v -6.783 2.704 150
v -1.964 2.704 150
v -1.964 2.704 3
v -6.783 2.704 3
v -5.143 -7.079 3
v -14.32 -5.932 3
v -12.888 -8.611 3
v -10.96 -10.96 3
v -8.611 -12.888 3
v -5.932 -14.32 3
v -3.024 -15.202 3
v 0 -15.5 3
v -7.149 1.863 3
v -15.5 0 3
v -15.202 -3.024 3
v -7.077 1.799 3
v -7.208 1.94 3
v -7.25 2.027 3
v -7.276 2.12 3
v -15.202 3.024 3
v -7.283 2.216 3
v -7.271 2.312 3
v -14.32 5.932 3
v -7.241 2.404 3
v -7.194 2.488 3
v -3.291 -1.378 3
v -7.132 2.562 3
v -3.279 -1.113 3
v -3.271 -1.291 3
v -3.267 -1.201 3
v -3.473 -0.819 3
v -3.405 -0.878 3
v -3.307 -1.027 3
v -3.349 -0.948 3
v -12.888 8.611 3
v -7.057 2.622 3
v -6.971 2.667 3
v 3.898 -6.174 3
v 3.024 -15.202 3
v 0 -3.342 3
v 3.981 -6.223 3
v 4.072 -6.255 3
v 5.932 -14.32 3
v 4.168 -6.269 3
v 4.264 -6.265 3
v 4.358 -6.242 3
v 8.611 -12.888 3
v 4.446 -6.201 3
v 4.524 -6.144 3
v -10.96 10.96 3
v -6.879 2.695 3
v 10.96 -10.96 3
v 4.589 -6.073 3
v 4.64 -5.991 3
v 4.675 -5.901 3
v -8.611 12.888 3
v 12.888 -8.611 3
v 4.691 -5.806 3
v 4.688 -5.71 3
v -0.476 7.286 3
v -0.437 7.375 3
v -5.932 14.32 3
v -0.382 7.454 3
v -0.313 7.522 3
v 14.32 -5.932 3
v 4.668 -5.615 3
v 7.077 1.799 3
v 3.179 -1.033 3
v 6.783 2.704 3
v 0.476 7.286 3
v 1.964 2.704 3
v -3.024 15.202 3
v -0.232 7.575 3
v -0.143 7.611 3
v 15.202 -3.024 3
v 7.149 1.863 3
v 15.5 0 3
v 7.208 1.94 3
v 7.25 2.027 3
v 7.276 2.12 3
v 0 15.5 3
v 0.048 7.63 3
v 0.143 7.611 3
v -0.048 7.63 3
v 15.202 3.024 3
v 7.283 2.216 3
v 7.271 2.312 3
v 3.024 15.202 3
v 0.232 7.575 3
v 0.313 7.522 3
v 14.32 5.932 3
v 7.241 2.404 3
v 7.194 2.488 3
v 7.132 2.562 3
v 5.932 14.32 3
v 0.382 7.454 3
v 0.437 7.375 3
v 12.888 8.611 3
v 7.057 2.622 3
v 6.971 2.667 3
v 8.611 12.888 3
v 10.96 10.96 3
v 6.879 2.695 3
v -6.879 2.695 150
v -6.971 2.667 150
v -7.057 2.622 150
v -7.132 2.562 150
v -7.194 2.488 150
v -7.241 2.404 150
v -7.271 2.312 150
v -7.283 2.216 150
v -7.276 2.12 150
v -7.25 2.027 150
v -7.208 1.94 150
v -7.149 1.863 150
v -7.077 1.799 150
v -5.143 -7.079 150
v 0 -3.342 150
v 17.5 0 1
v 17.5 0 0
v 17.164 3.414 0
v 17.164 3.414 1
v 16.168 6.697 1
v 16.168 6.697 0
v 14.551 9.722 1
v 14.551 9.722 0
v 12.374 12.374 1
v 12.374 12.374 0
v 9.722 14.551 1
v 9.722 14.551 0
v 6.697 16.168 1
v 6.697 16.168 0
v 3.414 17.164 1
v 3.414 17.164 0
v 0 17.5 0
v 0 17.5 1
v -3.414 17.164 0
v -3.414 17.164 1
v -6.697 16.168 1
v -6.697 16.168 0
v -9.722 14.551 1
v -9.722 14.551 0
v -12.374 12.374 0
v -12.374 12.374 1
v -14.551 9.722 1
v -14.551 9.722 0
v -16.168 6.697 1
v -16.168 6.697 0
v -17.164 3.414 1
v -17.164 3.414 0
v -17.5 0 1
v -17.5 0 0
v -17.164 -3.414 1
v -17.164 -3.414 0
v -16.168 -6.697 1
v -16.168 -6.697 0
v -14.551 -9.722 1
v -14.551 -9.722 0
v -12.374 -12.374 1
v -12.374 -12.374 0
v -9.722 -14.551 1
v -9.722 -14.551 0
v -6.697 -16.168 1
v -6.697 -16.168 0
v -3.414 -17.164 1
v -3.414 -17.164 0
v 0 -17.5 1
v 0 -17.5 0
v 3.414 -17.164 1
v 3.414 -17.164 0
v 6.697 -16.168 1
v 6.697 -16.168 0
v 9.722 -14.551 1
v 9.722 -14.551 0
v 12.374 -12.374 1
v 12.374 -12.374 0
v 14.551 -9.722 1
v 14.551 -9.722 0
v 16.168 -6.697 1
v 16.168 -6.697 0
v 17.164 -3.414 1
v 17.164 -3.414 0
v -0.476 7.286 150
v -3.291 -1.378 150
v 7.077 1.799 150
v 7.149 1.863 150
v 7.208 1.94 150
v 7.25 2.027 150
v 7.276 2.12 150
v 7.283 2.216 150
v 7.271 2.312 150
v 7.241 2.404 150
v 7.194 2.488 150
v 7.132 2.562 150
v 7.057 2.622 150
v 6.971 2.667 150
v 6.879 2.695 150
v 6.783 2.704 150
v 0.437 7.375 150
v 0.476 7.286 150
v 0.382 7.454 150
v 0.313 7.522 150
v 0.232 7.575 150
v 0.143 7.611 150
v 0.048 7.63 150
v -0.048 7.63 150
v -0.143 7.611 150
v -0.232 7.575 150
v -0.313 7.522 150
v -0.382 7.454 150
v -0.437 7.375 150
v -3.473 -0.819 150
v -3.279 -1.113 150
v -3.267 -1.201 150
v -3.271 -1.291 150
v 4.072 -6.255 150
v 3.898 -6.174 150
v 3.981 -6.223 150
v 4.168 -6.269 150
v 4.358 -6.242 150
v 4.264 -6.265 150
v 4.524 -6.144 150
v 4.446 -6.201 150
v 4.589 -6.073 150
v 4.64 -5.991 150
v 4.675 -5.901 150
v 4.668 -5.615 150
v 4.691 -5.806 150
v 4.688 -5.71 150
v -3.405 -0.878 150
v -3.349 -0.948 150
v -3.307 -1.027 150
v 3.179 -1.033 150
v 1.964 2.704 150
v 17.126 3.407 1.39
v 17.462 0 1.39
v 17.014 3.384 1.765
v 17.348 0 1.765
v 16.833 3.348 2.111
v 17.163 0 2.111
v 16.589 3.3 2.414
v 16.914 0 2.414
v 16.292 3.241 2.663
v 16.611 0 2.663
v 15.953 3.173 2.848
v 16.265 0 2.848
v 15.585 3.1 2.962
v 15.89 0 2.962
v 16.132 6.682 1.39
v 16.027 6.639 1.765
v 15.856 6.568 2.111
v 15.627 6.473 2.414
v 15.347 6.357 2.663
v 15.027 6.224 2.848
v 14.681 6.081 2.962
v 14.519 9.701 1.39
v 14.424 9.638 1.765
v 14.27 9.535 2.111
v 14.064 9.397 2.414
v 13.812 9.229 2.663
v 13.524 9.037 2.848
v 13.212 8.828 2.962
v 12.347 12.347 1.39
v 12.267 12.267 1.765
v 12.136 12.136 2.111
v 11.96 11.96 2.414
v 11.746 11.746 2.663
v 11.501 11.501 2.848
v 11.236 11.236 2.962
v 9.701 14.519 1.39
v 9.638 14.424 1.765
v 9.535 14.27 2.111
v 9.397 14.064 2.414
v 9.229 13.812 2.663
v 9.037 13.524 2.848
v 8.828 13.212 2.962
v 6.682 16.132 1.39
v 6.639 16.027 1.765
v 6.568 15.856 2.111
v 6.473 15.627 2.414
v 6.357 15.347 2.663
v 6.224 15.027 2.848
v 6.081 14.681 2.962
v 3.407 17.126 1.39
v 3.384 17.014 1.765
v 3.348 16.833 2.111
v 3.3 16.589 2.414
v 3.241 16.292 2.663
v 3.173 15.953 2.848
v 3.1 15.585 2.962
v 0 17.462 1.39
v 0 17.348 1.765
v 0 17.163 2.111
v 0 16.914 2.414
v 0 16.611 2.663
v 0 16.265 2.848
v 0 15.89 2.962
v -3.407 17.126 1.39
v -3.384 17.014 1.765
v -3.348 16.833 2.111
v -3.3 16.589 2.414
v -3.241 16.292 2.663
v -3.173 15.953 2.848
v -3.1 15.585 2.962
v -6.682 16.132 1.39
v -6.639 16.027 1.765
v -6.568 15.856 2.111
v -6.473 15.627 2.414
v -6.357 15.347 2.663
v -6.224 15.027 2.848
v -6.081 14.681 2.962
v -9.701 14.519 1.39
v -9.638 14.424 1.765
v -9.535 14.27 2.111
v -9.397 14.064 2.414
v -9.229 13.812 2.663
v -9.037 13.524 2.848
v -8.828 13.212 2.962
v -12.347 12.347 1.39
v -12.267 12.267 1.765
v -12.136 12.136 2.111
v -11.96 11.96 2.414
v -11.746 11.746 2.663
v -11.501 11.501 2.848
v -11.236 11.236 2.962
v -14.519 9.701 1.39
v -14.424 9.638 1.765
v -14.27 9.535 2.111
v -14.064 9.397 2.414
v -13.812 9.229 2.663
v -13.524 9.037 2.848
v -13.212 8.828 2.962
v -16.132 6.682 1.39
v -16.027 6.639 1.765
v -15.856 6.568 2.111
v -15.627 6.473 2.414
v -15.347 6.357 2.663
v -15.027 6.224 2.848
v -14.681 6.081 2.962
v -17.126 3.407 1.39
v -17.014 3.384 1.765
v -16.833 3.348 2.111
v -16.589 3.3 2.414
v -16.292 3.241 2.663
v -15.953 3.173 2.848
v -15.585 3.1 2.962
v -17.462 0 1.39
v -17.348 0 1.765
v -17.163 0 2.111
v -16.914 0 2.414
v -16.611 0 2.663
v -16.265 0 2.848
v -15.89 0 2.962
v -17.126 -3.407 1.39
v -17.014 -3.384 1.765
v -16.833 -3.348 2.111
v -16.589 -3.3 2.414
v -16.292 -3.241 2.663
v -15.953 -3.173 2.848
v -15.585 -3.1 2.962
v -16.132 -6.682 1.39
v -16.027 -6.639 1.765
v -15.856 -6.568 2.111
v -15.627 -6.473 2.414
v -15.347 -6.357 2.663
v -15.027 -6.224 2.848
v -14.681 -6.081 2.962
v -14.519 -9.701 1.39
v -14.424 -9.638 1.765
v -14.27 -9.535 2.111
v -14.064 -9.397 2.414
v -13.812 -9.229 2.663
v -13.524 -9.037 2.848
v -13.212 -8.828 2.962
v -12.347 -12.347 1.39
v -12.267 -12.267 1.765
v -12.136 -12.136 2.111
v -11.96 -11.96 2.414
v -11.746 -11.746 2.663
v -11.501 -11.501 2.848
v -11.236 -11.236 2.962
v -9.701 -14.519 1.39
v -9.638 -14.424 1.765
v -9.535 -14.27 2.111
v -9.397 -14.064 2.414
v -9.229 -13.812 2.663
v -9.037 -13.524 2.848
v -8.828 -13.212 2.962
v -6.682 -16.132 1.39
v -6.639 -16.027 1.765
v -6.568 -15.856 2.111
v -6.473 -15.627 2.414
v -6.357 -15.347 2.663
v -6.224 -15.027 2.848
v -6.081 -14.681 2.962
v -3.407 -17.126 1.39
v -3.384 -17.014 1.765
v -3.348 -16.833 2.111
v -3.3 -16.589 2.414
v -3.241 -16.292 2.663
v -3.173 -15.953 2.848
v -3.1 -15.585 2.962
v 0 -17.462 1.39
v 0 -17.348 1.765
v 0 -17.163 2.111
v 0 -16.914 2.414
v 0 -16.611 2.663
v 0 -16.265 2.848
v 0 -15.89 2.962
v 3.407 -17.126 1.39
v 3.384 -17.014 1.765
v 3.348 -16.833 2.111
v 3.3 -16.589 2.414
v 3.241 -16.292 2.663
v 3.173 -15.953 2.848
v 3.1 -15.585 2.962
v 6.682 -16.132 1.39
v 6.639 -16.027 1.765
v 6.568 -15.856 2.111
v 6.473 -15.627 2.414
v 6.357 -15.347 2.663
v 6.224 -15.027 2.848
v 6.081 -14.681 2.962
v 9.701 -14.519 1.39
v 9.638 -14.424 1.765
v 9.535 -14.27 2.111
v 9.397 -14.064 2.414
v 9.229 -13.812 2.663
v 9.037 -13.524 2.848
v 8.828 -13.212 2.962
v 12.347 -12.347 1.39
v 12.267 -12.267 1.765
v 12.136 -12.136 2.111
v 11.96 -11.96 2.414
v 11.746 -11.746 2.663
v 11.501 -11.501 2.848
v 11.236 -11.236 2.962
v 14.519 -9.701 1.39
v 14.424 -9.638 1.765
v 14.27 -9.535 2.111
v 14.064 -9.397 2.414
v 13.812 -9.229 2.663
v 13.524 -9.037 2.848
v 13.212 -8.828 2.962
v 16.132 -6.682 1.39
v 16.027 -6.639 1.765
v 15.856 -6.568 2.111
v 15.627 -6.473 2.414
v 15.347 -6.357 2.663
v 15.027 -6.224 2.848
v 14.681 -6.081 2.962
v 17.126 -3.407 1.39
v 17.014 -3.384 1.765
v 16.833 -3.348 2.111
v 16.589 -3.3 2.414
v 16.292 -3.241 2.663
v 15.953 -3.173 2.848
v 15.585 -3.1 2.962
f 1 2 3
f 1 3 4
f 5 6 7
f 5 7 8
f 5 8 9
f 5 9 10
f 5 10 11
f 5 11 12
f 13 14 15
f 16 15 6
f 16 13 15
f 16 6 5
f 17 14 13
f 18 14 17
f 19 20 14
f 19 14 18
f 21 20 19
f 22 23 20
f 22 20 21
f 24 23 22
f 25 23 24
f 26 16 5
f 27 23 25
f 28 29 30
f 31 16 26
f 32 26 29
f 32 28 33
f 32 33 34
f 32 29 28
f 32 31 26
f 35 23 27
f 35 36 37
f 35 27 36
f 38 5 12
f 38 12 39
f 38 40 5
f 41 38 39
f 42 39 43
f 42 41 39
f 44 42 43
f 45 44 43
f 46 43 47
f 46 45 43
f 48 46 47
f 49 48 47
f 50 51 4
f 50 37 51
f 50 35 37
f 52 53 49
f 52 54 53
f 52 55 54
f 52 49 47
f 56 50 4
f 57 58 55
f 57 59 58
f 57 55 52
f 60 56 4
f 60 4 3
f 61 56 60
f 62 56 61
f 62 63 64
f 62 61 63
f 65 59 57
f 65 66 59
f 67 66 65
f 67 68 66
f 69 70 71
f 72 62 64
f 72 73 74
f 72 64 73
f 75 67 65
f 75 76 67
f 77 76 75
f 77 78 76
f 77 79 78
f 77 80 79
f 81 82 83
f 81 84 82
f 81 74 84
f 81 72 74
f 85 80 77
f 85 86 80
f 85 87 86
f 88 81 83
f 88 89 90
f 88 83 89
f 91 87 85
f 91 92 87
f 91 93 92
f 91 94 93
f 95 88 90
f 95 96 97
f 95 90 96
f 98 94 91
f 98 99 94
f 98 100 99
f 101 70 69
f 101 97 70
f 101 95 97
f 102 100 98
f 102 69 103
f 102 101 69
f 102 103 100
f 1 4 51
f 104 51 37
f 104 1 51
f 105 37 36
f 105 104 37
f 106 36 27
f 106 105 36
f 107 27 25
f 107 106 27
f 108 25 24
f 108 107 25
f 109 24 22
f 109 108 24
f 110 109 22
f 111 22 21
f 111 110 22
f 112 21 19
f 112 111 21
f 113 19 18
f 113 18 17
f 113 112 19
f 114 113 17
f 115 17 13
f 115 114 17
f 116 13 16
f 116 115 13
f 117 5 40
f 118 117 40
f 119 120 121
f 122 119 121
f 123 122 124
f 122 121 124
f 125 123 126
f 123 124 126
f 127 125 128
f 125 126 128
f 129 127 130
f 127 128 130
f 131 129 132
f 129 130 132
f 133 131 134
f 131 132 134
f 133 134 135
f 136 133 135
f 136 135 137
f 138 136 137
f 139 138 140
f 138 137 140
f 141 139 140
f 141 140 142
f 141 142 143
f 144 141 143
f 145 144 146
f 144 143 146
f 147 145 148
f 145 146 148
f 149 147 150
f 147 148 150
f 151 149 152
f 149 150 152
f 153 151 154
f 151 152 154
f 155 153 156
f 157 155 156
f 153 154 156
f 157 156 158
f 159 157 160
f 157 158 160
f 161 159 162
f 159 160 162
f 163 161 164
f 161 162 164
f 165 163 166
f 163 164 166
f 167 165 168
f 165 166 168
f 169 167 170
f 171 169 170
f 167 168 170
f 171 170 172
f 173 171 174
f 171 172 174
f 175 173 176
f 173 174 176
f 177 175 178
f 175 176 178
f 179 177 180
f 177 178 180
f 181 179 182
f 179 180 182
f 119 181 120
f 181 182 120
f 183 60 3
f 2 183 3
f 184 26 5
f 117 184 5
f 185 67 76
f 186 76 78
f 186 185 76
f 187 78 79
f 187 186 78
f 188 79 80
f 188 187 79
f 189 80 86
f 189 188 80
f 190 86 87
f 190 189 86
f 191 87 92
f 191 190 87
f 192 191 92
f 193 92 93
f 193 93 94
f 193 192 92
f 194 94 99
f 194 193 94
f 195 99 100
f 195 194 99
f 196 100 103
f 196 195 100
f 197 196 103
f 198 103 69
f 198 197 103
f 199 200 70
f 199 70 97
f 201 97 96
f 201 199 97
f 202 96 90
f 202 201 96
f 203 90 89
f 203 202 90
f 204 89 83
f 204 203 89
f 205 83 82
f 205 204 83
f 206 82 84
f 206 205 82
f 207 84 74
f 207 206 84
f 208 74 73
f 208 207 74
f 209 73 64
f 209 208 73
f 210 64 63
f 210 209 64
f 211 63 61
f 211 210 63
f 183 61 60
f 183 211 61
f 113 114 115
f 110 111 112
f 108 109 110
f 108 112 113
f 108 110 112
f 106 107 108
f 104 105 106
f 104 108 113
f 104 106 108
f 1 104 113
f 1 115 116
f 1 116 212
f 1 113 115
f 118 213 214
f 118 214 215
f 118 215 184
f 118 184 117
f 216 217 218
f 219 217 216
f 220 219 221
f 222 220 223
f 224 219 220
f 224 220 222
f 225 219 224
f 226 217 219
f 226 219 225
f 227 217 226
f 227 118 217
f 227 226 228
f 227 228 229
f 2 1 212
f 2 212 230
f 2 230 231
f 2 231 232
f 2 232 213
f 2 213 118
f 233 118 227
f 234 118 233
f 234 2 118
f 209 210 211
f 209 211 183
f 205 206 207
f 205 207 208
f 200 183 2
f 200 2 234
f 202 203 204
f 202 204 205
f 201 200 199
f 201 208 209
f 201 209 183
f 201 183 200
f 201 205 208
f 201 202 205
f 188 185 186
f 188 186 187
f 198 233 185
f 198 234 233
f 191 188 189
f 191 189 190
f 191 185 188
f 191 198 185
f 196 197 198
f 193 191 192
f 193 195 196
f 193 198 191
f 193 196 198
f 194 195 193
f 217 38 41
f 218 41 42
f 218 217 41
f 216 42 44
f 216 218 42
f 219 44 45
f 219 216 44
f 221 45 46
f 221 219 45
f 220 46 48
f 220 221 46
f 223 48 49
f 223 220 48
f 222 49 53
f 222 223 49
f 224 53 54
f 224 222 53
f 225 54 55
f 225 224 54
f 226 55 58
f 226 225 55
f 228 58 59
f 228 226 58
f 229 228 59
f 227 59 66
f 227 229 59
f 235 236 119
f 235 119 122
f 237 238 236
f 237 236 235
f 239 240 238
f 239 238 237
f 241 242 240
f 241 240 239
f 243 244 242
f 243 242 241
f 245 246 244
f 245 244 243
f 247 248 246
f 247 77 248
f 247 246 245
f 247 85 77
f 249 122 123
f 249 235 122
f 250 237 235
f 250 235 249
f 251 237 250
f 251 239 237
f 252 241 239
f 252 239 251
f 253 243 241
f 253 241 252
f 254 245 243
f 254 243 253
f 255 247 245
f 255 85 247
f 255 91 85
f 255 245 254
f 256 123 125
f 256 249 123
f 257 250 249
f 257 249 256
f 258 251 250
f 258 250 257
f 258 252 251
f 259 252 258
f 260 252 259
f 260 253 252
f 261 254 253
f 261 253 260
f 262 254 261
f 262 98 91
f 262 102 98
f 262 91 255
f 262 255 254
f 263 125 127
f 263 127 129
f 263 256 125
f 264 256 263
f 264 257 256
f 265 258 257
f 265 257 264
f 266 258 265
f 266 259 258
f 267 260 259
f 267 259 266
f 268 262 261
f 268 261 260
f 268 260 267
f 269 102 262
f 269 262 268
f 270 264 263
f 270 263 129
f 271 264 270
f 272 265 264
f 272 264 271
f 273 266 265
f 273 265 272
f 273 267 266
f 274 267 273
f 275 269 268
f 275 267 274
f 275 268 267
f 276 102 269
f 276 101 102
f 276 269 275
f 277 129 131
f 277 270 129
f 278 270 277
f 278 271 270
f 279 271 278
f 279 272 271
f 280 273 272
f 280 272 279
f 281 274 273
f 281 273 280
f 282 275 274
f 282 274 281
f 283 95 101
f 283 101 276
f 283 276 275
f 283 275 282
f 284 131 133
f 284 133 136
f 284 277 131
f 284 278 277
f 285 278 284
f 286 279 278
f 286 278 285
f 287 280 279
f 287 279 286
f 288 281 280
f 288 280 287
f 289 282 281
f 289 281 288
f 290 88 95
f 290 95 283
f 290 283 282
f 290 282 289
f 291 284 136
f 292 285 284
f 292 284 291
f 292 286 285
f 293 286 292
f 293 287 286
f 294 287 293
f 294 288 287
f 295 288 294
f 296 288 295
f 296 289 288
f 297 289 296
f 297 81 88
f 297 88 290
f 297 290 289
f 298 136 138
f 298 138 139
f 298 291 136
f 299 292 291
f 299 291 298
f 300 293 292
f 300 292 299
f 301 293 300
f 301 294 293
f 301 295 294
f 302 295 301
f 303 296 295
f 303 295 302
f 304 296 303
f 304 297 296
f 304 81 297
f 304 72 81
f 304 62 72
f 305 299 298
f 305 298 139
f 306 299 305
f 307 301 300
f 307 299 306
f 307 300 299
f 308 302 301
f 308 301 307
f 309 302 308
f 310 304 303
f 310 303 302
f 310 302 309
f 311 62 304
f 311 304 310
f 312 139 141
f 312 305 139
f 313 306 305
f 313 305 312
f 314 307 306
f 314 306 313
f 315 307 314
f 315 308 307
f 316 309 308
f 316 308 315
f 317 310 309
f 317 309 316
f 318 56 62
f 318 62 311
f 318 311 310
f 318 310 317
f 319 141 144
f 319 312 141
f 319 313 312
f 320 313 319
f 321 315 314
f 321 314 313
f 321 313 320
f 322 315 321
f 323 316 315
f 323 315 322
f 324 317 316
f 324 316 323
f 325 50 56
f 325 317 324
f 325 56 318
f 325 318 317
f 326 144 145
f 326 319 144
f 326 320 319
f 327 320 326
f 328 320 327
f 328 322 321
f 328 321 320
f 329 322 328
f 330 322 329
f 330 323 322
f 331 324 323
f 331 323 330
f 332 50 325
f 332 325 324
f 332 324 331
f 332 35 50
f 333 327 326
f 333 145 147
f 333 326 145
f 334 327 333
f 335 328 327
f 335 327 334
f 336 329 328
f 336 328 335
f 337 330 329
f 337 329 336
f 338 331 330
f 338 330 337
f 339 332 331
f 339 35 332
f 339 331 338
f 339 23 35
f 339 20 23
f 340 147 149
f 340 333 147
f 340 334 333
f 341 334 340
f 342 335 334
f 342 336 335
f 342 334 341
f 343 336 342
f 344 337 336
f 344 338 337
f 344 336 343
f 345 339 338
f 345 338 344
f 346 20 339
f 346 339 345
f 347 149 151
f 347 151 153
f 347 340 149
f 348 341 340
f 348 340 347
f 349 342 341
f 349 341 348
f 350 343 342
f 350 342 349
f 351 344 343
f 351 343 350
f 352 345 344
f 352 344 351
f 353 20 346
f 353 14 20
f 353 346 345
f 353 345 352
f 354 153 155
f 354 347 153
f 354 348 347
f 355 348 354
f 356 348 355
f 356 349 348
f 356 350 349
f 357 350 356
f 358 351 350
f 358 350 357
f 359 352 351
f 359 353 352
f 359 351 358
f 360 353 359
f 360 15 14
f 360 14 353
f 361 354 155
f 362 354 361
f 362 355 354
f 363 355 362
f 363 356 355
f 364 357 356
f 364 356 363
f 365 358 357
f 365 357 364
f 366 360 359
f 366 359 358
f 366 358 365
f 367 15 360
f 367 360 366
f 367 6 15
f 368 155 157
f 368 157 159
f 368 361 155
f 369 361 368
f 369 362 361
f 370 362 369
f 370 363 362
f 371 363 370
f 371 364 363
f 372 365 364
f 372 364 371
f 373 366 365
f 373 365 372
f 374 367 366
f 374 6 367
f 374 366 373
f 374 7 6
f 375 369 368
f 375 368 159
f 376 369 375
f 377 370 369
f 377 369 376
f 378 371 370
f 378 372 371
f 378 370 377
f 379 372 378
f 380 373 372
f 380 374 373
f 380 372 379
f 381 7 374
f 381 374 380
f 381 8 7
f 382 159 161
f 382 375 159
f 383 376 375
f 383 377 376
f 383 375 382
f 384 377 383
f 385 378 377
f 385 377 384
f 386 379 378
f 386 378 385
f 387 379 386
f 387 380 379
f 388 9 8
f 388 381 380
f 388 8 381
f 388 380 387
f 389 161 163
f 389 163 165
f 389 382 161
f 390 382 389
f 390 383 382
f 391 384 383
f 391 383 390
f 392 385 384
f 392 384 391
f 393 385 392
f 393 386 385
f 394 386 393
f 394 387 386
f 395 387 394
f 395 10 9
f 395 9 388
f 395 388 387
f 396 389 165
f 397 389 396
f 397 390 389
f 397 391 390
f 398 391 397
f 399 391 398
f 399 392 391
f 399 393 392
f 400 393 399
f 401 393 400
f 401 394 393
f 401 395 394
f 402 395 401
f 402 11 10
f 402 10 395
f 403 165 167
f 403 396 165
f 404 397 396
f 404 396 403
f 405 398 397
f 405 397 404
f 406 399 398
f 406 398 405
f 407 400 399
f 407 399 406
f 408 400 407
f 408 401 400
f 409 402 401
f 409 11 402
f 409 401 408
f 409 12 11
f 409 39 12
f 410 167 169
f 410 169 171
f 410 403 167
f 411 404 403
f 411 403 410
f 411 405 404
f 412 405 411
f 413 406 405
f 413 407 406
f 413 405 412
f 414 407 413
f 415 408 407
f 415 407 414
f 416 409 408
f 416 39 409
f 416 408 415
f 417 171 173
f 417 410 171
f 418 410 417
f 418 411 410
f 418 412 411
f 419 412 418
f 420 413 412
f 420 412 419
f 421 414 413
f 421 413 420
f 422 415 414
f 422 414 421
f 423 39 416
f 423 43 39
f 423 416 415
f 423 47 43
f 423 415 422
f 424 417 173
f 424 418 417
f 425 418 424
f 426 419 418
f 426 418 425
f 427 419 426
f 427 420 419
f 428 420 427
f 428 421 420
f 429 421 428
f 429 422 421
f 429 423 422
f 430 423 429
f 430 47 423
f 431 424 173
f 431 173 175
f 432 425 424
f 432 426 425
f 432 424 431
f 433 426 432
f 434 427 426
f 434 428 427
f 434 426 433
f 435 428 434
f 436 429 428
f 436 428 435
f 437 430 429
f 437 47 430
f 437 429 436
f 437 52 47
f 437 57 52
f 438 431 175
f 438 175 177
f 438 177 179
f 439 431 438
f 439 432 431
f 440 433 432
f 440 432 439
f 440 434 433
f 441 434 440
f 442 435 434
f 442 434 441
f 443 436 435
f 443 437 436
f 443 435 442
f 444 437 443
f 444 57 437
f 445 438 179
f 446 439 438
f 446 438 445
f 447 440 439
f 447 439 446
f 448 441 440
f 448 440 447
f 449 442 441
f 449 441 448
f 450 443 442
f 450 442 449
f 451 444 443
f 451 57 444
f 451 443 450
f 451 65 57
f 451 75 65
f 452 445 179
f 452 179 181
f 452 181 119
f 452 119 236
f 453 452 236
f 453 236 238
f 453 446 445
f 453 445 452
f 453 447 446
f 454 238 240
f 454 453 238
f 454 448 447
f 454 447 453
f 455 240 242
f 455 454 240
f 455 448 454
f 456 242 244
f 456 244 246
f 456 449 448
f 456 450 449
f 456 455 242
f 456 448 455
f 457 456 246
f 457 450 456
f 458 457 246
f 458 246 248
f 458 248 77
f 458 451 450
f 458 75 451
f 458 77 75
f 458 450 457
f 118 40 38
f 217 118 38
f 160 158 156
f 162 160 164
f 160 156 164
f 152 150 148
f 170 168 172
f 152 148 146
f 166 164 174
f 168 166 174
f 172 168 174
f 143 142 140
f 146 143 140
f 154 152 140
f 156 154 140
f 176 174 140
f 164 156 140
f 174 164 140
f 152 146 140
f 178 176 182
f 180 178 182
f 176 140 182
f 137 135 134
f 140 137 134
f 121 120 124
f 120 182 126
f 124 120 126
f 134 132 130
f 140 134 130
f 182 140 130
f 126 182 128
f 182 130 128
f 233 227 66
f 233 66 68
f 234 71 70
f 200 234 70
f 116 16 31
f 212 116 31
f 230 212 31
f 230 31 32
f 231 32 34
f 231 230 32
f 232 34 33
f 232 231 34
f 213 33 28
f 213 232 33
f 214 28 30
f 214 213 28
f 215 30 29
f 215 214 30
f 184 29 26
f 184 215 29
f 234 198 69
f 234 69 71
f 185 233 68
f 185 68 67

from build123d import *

# Parameters (mm, degrees)
F1_DEPTH = 150
F2_R     = 0.5
F3_R     = 17.5
F4_DEPTH = 3
F5_R     = 2


with BuildPart() as f1:
    # F0 (on Top) → F1 (new body)
    with BuildSketch(Plane.XY):
        Polygon((3.178624, -1.032797), (8.321745, 2.703899), (1.964497, 2.703899), (0, 8.75), (-1.964497, 2.703899), (-8.321745, 2.703899), (-3.178624, -1.032797), (-5.143121, -7.078899), (0, -3.342203), (5.143121, -7.078899), align=None)
    extrude(amount=F1_DEPTH)

    # F2
    f2_edges = [f1.edges().sort_by_distance(p)[0] for p in [
        (-8.321745, 2.703899, 75),
        (-3.178624, -1.032797, 75),
        (5.143121, -7.078899, 75),
        (0, 8.75, 75),
        (8.321745, 2.703899, 75),
    ]]
    fillet(f2_edges, radius=F2_R)

    # F3 (on Top) → F4 (join)
    with BuildSketch(Plane.XY):
        Circle(F3_R)
    extrude(amount=F4_DEPTH)

    # F5
    f5_edges = [f1.edges().sort_by_distance(p)[0] for p in [
        (-17.5, 0, 3),
    ]]
    fillet(f5_edges, radius=F5_R)


solid = f1.part
